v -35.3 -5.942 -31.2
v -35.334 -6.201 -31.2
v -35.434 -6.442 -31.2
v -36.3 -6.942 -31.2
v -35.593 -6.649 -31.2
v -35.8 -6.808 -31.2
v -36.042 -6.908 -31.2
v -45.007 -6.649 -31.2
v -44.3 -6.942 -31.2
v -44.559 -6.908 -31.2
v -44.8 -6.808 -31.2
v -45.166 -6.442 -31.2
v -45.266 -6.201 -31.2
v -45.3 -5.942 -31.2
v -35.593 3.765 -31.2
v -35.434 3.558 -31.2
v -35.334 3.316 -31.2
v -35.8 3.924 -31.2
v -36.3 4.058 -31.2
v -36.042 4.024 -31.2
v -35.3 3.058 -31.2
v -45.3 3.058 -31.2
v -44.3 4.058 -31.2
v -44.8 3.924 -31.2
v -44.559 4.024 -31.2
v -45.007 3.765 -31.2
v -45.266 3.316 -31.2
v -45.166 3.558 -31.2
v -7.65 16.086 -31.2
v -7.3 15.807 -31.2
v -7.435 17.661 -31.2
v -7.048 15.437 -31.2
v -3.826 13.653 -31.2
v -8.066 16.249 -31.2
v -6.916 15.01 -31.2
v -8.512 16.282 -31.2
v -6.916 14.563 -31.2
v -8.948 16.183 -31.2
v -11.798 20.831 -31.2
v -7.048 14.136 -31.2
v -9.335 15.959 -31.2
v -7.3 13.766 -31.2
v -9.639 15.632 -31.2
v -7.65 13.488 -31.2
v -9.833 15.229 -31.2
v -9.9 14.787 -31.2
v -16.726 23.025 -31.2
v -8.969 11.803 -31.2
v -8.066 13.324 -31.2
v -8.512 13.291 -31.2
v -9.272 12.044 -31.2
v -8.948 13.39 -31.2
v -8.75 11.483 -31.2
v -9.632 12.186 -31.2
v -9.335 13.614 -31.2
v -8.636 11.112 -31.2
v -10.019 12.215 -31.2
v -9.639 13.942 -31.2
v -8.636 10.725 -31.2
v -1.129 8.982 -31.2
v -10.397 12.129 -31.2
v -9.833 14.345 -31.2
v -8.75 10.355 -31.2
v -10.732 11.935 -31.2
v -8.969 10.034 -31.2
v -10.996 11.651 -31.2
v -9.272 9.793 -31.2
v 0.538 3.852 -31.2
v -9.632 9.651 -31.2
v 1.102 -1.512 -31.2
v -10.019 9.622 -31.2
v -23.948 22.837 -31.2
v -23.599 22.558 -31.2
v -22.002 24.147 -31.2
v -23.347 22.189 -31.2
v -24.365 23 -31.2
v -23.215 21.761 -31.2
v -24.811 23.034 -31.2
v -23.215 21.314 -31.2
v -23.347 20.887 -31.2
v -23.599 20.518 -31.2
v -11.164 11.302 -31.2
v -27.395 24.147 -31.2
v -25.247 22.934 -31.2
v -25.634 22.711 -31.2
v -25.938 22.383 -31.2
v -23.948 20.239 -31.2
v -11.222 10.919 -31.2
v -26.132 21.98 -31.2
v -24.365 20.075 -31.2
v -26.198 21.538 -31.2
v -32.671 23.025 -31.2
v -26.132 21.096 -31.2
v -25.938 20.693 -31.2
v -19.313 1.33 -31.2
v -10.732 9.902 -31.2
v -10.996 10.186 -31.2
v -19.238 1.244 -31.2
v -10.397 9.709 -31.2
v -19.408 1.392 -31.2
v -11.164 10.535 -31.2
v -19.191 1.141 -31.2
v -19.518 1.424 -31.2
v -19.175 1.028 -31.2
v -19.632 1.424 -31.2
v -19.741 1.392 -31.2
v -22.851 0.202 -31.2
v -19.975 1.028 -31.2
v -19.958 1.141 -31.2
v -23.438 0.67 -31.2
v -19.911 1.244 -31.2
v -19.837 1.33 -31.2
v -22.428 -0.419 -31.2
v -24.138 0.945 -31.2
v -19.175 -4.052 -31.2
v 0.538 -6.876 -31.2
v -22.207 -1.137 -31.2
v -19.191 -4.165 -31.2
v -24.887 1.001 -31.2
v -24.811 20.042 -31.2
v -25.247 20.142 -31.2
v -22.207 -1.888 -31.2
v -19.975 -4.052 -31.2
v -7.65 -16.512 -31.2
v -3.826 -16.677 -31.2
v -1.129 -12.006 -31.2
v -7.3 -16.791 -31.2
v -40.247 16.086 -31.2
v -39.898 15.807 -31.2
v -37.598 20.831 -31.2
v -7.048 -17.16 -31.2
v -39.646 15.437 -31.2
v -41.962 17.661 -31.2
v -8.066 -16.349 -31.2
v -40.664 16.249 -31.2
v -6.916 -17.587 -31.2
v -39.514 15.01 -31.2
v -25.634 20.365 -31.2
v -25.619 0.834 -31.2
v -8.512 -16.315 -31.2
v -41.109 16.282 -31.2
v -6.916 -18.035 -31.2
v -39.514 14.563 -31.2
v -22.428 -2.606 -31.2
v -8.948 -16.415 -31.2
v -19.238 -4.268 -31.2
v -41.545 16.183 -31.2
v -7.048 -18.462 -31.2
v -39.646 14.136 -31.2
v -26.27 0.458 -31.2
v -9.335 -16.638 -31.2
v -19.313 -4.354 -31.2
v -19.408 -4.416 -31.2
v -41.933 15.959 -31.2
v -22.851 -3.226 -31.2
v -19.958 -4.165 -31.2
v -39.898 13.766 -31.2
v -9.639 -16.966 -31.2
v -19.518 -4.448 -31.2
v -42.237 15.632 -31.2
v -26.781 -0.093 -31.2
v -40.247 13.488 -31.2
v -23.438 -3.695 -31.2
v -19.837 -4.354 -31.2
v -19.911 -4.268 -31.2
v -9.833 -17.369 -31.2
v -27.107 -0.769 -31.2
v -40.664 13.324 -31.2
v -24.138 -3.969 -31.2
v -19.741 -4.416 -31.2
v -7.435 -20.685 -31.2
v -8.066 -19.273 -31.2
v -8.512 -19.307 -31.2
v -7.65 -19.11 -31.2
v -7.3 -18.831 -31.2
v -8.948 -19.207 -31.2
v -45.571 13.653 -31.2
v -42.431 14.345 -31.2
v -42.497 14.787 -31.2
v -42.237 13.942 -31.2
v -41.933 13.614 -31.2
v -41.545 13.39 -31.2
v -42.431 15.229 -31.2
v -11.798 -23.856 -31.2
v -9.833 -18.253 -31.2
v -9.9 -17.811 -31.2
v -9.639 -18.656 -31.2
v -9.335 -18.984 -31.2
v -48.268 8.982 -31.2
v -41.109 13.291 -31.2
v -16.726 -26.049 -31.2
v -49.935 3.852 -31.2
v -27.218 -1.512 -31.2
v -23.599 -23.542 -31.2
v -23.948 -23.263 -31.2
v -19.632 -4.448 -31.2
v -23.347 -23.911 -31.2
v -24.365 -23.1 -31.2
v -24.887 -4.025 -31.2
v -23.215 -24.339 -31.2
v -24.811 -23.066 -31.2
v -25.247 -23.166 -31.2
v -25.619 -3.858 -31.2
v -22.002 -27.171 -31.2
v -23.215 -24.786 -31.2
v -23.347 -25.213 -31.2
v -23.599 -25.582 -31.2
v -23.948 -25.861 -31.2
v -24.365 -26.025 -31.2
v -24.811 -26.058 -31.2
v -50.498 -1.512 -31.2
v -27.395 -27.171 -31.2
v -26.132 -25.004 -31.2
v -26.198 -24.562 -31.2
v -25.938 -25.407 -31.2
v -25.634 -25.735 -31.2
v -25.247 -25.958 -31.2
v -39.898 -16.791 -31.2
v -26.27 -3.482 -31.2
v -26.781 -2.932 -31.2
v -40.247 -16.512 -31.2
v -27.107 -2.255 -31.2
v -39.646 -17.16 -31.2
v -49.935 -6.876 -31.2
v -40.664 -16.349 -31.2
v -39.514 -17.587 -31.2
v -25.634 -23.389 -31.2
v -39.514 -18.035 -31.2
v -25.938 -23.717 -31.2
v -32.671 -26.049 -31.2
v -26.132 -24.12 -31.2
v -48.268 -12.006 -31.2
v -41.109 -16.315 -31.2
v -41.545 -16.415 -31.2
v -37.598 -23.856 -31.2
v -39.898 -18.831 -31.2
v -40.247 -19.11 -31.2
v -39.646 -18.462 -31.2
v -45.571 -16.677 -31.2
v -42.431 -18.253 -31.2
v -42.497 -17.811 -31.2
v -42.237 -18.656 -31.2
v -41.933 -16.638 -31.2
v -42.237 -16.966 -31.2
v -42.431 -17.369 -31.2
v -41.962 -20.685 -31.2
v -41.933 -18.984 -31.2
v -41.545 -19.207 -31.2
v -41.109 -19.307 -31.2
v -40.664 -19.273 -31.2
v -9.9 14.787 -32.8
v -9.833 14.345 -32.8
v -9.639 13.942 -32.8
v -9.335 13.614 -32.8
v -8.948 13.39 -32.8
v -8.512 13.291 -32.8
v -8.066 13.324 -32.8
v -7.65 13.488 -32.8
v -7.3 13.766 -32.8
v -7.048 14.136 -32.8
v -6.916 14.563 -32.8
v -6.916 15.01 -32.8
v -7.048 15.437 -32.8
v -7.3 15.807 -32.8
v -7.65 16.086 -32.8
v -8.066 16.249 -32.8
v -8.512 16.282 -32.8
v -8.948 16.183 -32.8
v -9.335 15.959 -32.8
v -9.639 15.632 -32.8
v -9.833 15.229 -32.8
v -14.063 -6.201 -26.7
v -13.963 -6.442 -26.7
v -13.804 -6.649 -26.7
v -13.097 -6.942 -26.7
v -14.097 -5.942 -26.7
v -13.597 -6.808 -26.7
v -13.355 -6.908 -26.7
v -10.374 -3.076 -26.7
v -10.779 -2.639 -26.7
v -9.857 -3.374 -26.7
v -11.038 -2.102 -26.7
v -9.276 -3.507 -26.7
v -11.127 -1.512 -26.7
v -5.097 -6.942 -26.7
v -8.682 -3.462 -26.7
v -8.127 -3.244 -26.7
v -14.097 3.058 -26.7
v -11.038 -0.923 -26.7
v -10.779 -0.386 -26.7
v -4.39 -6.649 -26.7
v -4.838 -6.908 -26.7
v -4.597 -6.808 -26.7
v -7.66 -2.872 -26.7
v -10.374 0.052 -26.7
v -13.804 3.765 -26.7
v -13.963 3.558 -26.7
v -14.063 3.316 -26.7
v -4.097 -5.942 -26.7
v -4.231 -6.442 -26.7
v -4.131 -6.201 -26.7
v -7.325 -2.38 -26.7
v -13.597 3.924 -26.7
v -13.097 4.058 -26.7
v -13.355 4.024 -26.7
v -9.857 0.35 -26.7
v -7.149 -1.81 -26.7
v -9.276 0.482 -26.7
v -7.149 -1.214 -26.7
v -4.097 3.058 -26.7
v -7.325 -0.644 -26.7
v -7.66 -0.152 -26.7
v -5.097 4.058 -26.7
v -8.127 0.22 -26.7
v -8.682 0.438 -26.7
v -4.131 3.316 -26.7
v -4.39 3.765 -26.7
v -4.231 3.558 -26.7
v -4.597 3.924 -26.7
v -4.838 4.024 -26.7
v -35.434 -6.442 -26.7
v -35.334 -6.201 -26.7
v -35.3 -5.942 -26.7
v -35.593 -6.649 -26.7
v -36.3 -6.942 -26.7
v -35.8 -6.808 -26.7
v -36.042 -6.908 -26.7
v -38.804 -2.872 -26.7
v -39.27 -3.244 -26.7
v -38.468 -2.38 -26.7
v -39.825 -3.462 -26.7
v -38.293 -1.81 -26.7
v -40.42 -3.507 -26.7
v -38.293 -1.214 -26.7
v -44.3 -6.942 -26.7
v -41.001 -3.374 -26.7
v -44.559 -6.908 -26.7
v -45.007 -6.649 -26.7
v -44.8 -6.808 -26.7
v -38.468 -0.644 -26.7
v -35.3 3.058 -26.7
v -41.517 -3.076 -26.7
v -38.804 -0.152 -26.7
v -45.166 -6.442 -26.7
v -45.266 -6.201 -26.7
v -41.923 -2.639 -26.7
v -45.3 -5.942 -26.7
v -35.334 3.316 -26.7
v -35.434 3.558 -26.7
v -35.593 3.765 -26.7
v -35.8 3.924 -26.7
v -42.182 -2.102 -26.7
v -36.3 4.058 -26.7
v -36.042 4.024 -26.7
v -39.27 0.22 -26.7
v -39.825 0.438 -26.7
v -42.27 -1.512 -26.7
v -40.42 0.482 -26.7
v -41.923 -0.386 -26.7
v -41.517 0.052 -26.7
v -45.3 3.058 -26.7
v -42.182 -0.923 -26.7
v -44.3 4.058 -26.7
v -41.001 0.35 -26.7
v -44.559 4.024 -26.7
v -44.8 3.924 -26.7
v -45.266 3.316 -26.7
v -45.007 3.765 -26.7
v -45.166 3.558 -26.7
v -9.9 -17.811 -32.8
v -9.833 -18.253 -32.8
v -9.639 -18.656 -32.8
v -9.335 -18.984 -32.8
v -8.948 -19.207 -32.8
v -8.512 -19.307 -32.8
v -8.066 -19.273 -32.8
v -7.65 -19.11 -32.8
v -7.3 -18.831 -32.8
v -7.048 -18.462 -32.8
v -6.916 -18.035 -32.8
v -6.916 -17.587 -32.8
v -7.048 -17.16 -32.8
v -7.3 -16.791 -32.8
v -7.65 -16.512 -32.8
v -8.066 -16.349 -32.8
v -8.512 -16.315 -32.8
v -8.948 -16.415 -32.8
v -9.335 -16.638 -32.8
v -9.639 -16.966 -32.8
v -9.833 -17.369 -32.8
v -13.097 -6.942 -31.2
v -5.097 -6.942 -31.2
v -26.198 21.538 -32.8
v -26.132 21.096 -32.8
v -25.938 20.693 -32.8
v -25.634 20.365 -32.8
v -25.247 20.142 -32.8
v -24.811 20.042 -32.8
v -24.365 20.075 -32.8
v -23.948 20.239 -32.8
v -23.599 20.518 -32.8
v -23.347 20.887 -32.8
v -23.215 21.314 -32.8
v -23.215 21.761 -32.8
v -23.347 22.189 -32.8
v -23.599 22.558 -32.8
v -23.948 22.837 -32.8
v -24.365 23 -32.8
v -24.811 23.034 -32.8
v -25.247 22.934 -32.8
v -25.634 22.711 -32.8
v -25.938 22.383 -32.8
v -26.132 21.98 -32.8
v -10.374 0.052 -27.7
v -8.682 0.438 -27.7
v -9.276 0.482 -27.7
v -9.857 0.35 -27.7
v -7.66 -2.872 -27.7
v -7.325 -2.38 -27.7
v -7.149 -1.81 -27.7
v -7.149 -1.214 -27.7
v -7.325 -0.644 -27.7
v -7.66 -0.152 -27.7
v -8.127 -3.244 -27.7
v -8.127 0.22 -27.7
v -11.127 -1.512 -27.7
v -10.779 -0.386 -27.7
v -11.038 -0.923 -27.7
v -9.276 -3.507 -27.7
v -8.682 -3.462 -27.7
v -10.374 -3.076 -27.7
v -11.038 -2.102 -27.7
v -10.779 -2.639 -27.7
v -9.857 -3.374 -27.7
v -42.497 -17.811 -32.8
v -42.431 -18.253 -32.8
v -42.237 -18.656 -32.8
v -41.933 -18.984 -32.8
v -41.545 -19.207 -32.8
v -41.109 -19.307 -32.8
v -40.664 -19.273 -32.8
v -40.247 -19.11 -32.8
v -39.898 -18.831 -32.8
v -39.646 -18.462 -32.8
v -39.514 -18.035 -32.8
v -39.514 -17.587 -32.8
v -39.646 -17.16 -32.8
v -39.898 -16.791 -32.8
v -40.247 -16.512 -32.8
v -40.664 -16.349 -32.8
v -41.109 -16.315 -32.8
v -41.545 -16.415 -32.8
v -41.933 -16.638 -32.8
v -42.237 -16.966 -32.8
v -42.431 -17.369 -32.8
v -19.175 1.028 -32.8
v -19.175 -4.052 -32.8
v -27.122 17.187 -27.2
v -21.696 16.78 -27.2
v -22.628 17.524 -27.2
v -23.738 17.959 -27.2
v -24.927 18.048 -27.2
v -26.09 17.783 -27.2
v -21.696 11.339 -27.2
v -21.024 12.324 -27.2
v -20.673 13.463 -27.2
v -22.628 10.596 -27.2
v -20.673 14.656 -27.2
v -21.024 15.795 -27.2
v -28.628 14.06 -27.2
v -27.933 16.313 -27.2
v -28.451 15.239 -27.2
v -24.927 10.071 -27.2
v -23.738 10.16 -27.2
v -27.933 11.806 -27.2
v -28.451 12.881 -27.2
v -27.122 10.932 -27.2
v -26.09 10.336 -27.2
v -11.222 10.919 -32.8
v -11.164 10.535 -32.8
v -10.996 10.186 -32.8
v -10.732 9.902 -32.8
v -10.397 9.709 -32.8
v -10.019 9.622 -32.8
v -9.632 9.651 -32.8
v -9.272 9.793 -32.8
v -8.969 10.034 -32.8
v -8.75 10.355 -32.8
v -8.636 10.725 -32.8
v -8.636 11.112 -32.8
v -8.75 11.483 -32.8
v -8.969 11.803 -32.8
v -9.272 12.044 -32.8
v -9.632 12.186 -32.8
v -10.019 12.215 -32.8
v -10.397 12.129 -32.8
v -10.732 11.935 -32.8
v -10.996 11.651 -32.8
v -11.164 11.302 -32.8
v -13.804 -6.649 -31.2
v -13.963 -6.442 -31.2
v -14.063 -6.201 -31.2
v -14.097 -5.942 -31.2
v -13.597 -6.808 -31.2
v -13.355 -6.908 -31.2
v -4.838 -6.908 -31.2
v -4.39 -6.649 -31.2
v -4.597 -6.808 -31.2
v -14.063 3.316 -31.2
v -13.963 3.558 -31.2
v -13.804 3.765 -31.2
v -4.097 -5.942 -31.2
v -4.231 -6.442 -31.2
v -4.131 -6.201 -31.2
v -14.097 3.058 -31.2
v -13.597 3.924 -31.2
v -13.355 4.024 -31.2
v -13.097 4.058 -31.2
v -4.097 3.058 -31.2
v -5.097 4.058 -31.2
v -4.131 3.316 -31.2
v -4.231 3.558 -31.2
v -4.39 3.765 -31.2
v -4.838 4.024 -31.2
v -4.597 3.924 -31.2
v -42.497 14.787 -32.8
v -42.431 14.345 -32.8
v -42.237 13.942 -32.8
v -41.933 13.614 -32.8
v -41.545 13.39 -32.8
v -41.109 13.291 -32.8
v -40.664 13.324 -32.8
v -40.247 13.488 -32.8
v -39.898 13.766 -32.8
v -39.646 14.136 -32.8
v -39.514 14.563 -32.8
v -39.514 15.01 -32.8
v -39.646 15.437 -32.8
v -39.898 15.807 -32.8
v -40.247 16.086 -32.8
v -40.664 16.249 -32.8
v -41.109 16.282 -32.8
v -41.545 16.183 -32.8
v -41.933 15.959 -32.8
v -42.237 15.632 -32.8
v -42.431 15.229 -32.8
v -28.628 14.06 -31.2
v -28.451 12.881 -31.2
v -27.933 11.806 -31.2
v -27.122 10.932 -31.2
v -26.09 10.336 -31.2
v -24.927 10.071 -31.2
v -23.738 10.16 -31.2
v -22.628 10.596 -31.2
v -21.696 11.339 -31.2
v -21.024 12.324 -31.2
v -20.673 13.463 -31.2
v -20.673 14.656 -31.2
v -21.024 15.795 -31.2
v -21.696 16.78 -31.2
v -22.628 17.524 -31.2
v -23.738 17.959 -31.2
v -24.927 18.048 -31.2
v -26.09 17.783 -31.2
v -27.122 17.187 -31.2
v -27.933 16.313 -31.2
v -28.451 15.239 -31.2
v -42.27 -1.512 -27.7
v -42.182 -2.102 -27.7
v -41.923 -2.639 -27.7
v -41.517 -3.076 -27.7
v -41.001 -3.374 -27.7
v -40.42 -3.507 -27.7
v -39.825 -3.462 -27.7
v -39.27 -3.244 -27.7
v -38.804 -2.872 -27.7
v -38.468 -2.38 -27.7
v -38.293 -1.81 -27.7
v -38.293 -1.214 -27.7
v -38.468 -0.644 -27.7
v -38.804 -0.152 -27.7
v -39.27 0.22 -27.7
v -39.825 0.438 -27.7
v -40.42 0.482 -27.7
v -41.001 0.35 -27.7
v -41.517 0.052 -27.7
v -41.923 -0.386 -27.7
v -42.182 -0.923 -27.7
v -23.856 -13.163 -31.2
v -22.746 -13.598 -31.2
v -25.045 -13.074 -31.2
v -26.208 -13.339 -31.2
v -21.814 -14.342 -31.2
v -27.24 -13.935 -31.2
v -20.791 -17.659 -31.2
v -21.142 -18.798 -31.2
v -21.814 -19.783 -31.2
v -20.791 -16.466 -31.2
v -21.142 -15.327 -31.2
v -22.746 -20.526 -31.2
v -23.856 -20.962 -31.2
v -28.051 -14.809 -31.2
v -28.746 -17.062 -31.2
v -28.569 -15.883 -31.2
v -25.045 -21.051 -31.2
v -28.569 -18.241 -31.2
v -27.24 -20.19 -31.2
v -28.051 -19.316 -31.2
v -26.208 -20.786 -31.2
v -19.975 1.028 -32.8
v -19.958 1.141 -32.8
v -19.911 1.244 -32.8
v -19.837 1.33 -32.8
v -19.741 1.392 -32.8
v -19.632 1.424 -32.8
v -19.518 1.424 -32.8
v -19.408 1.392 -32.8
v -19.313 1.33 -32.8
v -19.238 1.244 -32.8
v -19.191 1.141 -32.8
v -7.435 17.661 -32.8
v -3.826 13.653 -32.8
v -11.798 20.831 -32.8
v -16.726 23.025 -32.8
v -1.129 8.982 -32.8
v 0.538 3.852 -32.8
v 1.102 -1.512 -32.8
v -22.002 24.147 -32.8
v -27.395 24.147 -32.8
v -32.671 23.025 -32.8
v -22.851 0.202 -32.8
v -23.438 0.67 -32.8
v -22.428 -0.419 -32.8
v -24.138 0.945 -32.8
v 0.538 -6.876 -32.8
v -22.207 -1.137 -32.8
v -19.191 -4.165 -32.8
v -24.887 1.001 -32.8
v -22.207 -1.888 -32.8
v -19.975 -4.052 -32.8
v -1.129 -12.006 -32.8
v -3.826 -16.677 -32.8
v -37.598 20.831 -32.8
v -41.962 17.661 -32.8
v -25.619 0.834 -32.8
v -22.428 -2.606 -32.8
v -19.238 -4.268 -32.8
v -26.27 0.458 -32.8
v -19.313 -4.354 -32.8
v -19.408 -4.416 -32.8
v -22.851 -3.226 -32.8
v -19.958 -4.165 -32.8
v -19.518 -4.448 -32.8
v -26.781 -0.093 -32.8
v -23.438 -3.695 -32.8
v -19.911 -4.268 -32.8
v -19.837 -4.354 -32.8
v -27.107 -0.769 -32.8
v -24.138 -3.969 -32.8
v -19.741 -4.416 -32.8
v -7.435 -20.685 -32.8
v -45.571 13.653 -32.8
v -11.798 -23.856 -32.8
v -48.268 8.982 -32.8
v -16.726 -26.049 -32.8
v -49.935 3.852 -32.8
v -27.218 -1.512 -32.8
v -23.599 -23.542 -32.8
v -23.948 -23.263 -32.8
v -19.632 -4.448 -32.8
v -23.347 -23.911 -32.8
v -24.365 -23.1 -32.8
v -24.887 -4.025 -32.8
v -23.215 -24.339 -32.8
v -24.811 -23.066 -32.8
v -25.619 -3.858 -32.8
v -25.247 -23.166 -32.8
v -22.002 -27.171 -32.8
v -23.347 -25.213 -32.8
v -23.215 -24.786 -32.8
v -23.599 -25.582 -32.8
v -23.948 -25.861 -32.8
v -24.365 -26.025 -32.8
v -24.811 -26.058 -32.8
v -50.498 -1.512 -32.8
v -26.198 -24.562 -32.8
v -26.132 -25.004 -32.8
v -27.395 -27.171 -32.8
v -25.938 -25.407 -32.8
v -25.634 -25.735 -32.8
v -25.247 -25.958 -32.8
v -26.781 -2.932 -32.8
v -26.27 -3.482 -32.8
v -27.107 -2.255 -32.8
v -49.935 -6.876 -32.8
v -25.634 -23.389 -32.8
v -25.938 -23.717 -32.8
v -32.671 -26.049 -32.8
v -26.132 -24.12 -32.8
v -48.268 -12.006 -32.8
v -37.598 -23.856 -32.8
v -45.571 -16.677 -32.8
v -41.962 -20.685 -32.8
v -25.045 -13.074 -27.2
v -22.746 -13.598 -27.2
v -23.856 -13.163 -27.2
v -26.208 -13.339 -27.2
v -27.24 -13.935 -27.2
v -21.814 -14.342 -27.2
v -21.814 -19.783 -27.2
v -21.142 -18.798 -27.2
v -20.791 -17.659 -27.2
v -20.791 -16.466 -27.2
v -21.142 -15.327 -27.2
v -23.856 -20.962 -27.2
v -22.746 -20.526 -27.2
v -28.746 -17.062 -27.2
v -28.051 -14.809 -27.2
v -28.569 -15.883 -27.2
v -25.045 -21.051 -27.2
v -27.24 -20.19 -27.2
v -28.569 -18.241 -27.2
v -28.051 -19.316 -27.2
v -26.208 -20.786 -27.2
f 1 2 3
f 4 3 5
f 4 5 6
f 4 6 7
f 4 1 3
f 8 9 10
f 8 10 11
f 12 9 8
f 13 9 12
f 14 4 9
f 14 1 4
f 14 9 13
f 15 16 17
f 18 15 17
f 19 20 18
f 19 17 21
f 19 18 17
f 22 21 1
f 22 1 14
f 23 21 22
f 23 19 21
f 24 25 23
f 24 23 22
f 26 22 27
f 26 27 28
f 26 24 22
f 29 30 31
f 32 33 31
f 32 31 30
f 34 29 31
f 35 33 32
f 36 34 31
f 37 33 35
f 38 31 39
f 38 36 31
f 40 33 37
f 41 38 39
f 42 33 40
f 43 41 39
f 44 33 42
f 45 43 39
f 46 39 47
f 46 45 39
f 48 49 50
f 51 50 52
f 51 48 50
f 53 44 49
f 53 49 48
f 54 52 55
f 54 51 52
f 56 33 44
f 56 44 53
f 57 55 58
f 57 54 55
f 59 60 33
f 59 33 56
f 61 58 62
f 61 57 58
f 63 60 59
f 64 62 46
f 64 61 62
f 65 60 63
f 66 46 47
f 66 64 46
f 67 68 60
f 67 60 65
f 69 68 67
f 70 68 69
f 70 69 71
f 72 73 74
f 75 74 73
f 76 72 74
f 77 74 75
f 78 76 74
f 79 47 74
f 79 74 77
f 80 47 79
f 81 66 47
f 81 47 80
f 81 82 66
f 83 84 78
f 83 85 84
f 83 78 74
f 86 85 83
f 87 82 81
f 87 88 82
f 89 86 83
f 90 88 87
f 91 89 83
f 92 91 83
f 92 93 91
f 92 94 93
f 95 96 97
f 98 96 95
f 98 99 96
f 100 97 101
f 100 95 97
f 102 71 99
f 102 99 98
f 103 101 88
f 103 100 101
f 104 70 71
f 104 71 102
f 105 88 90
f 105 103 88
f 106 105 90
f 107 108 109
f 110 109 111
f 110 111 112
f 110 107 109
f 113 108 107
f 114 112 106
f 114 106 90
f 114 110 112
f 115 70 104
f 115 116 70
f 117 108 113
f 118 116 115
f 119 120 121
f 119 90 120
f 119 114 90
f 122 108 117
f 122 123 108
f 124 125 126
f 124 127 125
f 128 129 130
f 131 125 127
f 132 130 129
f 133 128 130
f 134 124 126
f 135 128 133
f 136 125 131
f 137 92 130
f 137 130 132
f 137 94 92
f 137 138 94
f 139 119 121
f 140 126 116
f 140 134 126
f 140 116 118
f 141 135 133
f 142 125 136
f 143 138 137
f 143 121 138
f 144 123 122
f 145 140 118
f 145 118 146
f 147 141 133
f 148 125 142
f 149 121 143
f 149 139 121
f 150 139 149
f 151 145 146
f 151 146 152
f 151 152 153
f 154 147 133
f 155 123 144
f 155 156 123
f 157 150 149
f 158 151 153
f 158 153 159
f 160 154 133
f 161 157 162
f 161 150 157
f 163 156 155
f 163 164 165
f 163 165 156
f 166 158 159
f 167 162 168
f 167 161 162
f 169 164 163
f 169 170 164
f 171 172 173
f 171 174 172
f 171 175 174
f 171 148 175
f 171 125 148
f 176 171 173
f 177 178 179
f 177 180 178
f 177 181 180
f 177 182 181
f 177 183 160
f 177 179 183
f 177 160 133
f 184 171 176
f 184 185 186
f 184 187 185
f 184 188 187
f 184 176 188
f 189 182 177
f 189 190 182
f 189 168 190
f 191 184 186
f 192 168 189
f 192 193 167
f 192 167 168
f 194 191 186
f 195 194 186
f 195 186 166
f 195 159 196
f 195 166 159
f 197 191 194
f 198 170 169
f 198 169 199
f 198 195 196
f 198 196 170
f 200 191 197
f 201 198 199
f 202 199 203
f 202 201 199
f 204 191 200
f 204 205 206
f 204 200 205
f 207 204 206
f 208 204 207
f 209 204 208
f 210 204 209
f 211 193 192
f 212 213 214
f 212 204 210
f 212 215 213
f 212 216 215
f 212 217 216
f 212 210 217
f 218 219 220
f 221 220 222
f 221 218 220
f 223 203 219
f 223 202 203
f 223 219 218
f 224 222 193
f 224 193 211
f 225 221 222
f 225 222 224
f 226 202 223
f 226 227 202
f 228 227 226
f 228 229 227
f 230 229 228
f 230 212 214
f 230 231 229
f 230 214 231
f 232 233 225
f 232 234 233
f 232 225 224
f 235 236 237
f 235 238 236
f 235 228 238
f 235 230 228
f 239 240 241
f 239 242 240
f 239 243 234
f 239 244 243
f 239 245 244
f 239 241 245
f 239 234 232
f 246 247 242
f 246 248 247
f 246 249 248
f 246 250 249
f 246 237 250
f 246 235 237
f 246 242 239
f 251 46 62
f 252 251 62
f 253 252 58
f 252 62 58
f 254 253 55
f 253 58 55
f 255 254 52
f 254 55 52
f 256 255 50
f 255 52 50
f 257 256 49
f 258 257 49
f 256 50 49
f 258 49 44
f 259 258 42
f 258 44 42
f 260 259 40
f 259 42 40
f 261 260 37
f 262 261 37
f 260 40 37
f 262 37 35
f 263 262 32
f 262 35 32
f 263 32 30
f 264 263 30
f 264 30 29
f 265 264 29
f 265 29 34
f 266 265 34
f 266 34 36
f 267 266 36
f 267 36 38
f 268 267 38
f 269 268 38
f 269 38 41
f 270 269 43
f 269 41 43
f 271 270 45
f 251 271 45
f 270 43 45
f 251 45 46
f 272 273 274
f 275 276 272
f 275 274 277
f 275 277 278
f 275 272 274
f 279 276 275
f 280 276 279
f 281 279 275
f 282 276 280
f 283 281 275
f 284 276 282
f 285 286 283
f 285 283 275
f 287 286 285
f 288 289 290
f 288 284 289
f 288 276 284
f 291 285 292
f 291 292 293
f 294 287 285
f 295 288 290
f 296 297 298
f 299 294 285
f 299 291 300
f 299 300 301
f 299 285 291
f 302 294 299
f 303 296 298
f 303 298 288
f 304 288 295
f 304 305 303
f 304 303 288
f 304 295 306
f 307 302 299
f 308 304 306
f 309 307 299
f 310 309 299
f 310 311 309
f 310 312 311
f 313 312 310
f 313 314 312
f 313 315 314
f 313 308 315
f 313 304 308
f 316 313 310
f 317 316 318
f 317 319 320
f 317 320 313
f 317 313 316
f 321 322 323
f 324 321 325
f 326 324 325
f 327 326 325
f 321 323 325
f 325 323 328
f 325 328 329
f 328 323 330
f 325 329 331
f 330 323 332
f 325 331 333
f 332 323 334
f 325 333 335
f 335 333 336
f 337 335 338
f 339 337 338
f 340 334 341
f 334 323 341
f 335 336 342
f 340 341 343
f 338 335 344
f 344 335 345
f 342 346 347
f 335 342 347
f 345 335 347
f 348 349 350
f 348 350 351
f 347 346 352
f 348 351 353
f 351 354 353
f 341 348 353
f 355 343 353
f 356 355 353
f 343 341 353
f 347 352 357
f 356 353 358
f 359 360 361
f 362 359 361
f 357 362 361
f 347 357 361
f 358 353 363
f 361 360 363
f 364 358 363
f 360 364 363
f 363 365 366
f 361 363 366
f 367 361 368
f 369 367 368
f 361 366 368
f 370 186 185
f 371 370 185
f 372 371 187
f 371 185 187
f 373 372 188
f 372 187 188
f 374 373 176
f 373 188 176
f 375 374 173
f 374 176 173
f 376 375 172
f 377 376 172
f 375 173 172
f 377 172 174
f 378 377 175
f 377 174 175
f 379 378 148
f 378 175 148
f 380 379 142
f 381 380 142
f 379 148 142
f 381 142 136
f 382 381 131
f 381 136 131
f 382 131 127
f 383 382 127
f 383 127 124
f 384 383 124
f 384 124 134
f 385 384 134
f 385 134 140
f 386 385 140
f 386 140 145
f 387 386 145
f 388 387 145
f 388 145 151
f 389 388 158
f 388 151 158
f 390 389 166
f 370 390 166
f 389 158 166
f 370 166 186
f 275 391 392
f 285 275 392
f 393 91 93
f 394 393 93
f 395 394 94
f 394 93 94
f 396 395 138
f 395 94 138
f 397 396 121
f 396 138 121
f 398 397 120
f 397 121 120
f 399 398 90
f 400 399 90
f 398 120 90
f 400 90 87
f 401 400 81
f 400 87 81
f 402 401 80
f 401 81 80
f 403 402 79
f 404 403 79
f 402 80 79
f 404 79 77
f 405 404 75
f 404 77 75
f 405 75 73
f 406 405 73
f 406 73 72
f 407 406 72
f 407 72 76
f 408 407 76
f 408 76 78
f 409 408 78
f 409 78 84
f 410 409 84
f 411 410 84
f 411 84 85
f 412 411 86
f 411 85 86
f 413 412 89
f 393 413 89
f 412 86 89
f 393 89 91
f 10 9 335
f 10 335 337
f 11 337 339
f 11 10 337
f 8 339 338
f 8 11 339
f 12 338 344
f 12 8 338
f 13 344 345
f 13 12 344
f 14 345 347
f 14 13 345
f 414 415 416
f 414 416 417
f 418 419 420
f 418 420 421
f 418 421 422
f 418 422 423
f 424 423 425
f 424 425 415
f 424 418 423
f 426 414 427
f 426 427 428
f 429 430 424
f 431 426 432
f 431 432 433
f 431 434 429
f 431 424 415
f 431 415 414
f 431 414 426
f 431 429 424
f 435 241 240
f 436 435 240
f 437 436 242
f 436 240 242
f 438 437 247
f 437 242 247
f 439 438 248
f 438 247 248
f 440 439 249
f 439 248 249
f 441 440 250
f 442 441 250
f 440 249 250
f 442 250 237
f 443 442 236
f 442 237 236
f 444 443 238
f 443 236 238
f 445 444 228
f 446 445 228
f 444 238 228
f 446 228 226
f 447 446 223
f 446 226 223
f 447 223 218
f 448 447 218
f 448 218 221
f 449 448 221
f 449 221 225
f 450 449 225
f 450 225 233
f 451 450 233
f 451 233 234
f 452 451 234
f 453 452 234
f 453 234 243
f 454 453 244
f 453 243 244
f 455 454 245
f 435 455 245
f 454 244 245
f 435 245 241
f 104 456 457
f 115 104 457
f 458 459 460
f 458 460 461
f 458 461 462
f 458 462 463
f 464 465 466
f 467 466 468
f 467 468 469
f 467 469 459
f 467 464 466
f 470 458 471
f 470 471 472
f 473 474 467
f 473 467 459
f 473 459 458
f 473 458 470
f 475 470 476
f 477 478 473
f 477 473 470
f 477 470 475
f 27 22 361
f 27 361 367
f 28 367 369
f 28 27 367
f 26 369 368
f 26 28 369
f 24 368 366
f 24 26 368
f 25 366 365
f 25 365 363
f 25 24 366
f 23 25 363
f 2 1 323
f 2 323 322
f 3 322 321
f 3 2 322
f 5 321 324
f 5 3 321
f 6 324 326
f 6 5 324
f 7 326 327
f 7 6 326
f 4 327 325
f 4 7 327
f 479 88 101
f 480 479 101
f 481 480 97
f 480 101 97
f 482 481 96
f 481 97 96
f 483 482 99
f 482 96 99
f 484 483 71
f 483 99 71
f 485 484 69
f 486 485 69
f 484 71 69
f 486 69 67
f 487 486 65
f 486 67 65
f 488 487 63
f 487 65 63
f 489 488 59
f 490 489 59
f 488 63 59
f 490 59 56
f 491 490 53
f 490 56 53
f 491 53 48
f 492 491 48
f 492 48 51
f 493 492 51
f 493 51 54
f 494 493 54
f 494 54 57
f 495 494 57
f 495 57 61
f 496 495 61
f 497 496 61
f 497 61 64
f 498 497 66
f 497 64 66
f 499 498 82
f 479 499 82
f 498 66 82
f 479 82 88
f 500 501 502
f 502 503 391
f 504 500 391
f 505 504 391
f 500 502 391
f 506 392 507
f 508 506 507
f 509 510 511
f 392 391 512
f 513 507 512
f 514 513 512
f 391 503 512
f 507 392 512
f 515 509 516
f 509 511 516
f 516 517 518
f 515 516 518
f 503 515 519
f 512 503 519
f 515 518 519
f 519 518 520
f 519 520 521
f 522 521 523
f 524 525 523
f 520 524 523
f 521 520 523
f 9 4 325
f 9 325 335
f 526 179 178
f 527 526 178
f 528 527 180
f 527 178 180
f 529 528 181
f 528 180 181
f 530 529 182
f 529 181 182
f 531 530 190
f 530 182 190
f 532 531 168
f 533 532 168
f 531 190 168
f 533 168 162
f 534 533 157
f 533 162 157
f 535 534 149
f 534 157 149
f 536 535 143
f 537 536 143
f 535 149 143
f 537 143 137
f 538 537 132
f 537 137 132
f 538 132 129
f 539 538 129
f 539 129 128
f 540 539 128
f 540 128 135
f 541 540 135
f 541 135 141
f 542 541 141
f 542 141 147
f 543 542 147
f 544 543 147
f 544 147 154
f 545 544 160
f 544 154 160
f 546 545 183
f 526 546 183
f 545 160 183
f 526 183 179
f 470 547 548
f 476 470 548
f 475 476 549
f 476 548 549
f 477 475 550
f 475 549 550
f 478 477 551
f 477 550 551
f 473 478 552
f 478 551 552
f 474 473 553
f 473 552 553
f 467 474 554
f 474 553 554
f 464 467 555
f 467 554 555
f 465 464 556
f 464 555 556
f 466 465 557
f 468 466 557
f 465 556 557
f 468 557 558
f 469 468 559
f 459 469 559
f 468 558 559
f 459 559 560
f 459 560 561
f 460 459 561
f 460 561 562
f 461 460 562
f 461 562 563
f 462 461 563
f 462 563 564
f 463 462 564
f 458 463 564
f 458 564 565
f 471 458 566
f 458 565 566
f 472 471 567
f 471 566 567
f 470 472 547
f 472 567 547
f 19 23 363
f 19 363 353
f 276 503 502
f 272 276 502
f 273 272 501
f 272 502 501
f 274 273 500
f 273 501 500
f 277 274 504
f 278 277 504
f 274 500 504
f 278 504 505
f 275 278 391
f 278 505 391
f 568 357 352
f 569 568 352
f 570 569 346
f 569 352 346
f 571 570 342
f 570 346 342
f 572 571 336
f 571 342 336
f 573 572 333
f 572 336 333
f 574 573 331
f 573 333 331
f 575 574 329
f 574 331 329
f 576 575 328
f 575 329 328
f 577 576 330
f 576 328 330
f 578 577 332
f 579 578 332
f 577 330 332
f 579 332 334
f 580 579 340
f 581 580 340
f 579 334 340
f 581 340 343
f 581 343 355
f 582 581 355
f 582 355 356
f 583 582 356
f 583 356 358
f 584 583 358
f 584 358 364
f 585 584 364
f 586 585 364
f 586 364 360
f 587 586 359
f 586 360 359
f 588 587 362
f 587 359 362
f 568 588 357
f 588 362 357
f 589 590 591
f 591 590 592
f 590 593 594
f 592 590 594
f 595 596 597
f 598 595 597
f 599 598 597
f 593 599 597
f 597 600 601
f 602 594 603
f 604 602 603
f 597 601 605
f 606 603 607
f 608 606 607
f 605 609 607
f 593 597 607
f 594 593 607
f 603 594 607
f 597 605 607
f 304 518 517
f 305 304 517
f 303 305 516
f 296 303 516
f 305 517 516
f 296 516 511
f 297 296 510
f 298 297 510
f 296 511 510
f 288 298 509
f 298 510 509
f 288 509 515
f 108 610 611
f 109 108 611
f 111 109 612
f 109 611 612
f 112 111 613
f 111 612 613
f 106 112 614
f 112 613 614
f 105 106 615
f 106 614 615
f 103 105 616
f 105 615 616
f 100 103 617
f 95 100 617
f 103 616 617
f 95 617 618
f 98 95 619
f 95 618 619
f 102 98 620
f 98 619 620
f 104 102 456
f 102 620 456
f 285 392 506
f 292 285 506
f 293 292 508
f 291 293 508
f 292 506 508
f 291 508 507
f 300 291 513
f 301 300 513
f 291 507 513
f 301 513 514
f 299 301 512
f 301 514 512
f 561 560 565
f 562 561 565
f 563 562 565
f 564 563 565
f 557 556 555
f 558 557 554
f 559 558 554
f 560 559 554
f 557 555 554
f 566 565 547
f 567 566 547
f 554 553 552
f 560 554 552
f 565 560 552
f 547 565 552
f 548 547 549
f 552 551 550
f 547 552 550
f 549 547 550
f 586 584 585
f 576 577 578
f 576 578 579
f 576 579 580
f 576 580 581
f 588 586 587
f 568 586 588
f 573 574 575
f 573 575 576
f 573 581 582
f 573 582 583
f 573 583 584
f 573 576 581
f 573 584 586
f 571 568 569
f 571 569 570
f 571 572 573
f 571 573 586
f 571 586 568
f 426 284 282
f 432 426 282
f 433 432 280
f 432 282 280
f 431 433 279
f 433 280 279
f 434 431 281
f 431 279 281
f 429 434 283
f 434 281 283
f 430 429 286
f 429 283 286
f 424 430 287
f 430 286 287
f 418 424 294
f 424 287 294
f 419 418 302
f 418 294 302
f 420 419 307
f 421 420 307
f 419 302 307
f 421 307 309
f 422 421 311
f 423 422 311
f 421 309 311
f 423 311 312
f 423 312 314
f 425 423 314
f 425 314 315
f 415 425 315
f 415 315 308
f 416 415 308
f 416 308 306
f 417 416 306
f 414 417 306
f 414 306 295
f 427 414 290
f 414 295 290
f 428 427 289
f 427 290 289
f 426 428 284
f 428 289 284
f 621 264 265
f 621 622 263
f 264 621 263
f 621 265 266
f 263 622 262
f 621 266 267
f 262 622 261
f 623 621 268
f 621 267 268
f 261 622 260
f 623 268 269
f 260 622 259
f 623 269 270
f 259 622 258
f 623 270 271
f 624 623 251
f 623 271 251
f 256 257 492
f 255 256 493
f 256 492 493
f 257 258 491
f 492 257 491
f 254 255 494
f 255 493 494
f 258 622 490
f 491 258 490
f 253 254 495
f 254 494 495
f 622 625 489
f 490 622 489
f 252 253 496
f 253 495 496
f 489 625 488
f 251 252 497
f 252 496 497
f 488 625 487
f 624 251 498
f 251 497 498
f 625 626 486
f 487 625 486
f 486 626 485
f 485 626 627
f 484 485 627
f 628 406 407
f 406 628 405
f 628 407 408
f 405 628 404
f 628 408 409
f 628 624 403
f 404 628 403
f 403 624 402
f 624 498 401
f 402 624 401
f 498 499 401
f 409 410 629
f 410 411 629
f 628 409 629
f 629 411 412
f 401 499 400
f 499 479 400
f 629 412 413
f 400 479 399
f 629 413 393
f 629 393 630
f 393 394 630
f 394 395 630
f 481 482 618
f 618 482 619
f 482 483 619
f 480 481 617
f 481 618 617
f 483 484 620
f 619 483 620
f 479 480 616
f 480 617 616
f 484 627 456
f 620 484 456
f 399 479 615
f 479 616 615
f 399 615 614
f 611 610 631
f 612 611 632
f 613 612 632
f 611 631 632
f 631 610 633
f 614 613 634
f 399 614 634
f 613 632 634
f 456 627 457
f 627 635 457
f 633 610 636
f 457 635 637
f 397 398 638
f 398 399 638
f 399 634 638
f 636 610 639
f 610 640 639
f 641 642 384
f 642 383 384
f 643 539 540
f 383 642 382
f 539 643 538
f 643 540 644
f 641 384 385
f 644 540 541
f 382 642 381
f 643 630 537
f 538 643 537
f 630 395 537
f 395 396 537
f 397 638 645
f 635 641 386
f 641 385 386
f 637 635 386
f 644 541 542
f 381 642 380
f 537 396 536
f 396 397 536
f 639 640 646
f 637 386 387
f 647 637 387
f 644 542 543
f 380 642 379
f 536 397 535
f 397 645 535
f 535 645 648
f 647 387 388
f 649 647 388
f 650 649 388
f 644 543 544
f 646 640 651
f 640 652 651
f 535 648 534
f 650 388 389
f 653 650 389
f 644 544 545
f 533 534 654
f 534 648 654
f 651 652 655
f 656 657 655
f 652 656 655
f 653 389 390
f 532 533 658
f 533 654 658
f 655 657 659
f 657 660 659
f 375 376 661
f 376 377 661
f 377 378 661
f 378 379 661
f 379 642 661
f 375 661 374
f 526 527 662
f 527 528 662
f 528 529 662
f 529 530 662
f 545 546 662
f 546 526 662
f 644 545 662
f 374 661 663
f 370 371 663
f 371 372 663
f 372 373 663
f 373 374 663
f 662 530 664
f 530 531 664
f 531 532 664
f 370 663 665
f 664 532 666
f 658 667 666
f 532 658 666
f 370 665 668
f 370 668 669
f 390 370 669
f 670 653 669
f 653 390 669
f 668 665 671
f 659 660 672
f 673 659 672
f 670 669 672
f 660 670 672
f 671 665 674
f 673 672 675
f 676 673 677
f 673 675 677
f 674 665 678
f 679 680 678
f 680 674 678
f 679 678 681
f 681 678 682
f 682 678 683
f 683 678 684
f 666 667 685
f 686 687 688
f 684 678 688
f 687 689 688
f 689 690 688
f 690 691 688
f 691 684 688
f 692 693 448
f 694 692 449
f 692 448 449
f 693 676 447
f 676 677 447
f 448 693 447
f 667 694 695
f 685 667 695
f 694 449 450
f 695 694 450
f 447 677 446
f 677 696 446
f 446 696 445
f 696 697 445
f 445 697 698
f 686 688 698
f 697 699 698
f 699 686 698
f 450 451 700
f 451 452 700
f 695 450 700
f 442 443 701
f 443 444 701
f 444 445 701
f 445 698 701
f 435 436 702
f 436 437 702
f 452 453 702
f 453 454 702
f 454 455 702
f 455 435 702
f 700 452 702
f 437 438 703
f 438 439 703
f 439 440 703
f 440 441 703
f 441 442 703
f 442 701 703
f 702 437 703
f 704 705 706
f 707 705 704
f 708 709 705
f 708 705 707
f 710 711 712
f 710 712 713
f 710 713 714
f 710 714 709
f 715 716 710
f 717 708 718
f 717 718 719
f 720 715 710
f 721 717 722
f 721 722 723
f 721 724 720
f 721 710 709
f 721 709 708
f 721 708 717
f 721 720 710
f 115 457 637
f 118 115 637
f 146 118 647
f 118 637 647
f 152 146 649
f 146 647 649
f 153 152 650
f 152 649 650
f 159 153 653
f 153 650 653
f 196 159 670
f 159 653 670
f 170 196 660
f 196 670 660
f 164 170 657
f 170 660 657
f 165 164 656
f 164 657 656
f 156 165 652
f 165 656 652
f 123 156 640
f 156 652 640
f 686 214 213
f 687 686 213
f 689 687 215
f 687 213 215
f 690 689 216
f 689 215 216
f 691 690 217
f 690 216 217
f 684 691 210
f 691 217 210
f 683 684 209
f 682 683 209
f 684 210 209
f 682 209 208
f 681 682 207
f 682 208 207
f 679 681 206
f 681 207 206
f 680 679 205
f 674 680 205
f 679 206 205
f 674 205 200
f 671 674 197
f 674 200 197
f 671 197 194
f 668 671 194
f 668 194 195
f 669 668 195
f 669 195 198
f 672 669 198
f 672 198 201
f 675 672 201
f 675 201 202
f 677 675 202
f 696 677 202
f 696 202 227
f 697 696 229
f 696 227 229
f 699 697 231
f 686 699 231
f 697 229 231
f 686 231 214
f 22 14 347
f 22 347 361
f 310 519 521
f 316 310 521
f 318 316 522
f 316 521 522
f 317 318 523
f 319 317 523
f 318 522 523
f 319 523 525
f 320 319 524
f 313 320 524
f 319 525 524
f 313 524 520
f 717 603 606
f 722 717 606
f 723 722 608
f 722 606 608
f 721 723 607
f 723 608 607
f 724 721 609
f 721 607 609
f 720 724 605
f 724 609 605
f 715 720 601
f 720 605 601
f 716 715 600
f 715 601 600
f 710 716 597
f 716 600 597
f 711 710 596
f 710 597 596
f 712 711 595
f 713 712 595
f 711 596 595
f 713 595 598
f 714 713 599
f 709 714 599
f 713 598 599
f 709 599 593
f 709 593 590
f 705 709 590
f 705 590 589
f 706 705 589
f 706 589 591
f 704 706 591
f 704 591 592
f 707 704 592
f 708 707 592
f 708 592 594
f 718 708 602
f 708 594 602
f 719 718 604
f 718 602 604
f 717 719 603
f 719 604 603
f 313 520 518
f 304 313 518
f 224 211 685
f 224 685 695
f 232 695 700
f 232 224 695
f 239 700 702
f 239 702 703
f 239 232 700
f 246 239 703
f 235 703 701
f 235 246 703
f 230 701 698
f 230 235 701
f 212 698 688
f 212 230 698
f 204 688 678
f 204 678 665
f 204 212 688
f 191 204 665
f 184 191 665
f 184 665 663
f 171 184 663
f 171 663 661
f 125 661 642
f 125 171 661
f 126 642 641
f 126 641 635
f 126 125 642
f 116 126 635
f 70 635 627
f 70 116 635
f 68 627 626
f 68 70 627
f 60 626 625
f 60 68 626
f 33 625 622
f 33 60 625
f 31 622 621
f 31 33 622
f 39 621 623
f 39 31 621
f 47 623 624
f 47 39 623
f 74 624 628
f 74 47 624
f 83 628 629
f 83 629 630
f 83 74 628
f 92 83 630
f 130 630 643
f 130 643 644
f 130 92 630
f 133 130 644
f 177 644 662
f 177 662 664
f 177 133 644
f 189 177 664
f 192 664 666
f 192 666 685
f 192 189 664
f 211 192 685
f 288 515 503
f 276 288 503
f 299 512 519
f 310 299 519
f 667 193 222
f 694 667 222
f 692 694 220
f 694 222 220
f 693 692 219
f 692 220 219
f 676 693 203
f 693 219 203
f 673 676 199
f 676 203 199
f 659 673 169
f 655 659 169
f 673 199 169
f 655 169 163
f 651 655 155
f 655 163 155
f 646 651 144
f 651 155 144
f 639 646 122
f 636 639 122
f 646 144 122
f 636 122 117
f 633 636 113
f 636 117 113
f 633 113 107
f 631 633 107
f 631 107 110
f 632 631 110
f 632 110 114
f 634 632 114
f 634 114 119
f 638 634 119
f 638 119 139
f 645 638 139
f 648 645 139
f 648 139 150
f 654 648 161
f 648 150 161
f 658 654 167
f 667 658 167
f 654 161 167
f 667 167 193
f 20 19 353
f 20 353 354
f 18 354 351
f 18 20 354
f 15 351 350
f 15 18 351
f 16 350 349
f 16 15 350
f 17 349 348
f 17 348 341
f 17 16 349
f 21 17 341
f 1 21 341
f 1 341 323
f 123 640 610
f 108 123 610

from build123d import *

# Parameters (mm, degrees)
EXTRUDE_START       = -31.200418
SKETCH_1_R          = 25.8
SKETCH_1_R_2        = 2.52
SKETCH_1_R_3        = 1.5
SKETCH_1_R_4        = 1.3
EXTRUDE_1_DEPTH     = 1.6
SKETCH_3_R          = 4
EXTRUDE_2_DEPTH     = 4
EXTRUDE_2_2_DEPTH   = 4
EXTRUDE_3_DEPTH     = 4.5
EXTRUDE_3_2_DEPTH   = 4.5
CUT_EXTRUDE_START   = -26.700418
SKETCH_5_R          = 2
CUT_EXTRUDE_1_DEPTH = 1
CUT_EXTRUDE_START_2 = -32.800418
CUT_EXTRUDE_2_DEPTH = 1.6


with BuildPart() as part:
    # 草图1 → 凸台-拉伸1 (new body)
    with BuildSketch(Plane.XY.offset(EXTRUDE_START)):
        with Locations(Location((-24.698490112, -1.512152456, 0), (0, 0, 180))):
            Circle(SKETCH_1_R)
        with Locations(Location((-24.698490112, -1.512152456, 0), (0, 0, 180))):
            Circle(SKETCH_1_R_2, mode=Mode.SUBTRACT)
        with Locations(Location((-24.698490112, 21.537847164, 0), (0, 0, 180))):
            Circle(SKETCH_1_R_3, mode=Mode.SUBTRACT)
        with Locations(Location((-40.997301149, 14.786658582, 0), (0, 0, 180))):
            Circle(SKETCH_1_R_3, mode=Mode.SUBTRACT)
        with Locations(Location((-40.997301149, -17.810963493, 0), (0, 0, 180))):
            Circle(SKETCH_1_R_3, mode=Mode.SUBTRACT)
        with Locations(Location((-24.698490112, -24.562152076, 0), (0, 0, 180))):
            Circle(SKETCH_1_R_3, mode=Mode.SUBTRACT)
        with Locations(Location((-8.399679074, -17.810963493, 0), (0, 0, 180))):
            Circle(SKETCH_1_R_3, mode=Mode.SUBTRACT)
        with Locations(Location((-8.399679074, 14.786658582, 0), (0, 0, 180))):
            Circle(SKETCH_1_R_3, mode=Mode.SUBTRACT)
        with Locations(Location((-9.921679074, 10.918658582, 0), (0, 0, 180))):
            Circle(SKETCH_1_R_4, mode=Mode.SUBTRACT)
    extrude(amount=-EXTRUDE_1_DEPTH)

    # 草图6 → 切除-拉伸2 (cut)
    with BuildSketch(Plane.XY.offset(CUT_EXTRUDE_START_2)):
        with BuildLine():
            Line((-19.174590627, 1.027847544), (-19.174590627, -4.052152456))
            ThreePointArc((-19.174590627, -4.052152456), (-19.574590627, -4.452152456), (-19.974590627, -4.052152456))
            Line((-19.974590627, -4.052152456), (-19.974590627, 1.027847544))
            ThreePointArc((-19.974590627, 1.027847544), (-19.574590627, 1.427847544), (-19.174590627, 1.027847544))
        make_face()
    extrude(amount=CUT_EXTRUDE_2_DEPTH, mode=Mode.SUBTRACT)


with BuildPart() as body_2:
    # 草图3 → 凸台-拉伸2 (new body)
    with BuildSketch(Plane.XY.offset(EXTRUDE_START)):
        with Locations(Location((-24.628347114, 14.059607135, 0), (0, 0, 180))):
            Circle(SKETCH_3_R)
    extrude(amount=EXTRUDE_2_DEPTH)


with BuildPart() as body_3:
    # 草图3 → Extrude 2 2 (new body)
    with BuildSketch(Plane.XY.offset(EXTRUDE_START)):
        with Locations(Location((-24.746304895, -17.062338322, 0), (0, 0, 180))):
            Circle(SKETCH_3_R)
    extrude(amount=EXTRUDE_2_2_DEPTH)


with BuildPart() as body_4:
    # 草图4 → 凸台-拉伸3 (new body)
    with BuildSketch(Plane.XY.offset(EXTRUDE_START)):
        with BuildLine():
            Line((-4.09665046, -1.442388212), (-4.09665046, 3.057611788))
            ThreePointArc((-4.09665046, 3.057611788), (-4.389543679, 3.764718569), (-5.09665046, 4.057611788))
            Line((-5.09665046, 4.057611788), (-13.09665046, 4.057611788))
            ThreePointArc((-13.09665046, 4.057611788), (-13.803757241, 3.764718569), (-14.09665046, 3.057611788))
            Line((-14.09665046, 3.057611788), (-14.09665046, -5.942388212))
            ThreePointArc((-14.09665046, -5.942388212), (-13.803757241, -6.649494993), (-13.09665046, -6.942388212))
            Line((-13.09665046, -6.942388212), (-5.09665046, -6.942388212))
            ThreePointArc((-5.09665046, -6.942388212), (-4.389543679, -6.649494993), (-4.09665046, -5.942388212))
            Line((-4.09665046, -5.942388212), (-4.09665046, -1.442388212))
        make_face()
    extrude(amount=EXTRUDE_3_DEPTH)


with BuildPart() as body_5:
    # 草图4 → Extrude 3 2 (new body)
    with BuildSketch(Plane.XY.offset(EXTRUDE_START)):
        with BuildLine():
            Line((-35.300329764, 3.057611788), (-35.300329764, -5.942388212))
            ThreePointArc((-35.300329764, -5.942388212), (-35.593222983, -6.649494993), (-36.300329764, -6.942388212))
            Line((-36.300329764, -6.942388212), (-44.300329764, -6.942388212))
            ThreePointArc((-44.300329764, -6.942388212), (-45.007436545, -6.649494993), (-45.300329764, -5.942388212))
            Line((-45.300329764, -5.942388212), (-45.300329764, -1.442388212))
            Line((-45.300329764, -1.442388212), (-45.300329764, 3.057611788))
            ThreePointArc((-45.300329764, 3.057611788), (-45.007436545, 3.764718569), (-44.300329764, 4.057611788))
            Line((-44.300329764, 4.057611788), (-36.300329764, 4.057611788))
            ThreePointArc((-36.300329764, 4.057611788), (-35.593222983, 3.764718569), (-35.300329764, 3.057611788))
        make_face()
    extrude(amount=EXTRUDE_3_2_DEPTH)


with BuildPart() as cut_extrude_1_tool:
    # 草图5 → 切除-拉伸1 (new body)
    with BuildSketch(Plane.XY.offset(CUT_EXTRUDE_START)):
        with Locations(Location((-9.126572542, -1.512152456, 0), (0, 0, 180))):
            Circle(SKETCH_5_R)
        with Locations(Location((-40.270407682, -1.512152456, 0), (0, 0, 180))):
            Circle(SKETCH_5_R)
    extrude(amount=-CUT_EXTRUDE_1_DEPTH)


with BuildPart() as body_4_1:
    add(body_4.part)

    # 切除-拉伸1: cut by cut_extrude_1_tool
    add(cut_extrude_1_tool.part, mode=Mode.SUBTRACT)


with BuildPart() as body_5_1:
    add(body_5.part)

    # 切除-拉伸1: cut by cut_extrude_1_tool
    add(cut_extrude_1_tool.part, mode=Mode.SUBTRACT)


solid = Compound([part.part, body_2.part, body_3.part, body_4_1.part, body_5_1.part])
